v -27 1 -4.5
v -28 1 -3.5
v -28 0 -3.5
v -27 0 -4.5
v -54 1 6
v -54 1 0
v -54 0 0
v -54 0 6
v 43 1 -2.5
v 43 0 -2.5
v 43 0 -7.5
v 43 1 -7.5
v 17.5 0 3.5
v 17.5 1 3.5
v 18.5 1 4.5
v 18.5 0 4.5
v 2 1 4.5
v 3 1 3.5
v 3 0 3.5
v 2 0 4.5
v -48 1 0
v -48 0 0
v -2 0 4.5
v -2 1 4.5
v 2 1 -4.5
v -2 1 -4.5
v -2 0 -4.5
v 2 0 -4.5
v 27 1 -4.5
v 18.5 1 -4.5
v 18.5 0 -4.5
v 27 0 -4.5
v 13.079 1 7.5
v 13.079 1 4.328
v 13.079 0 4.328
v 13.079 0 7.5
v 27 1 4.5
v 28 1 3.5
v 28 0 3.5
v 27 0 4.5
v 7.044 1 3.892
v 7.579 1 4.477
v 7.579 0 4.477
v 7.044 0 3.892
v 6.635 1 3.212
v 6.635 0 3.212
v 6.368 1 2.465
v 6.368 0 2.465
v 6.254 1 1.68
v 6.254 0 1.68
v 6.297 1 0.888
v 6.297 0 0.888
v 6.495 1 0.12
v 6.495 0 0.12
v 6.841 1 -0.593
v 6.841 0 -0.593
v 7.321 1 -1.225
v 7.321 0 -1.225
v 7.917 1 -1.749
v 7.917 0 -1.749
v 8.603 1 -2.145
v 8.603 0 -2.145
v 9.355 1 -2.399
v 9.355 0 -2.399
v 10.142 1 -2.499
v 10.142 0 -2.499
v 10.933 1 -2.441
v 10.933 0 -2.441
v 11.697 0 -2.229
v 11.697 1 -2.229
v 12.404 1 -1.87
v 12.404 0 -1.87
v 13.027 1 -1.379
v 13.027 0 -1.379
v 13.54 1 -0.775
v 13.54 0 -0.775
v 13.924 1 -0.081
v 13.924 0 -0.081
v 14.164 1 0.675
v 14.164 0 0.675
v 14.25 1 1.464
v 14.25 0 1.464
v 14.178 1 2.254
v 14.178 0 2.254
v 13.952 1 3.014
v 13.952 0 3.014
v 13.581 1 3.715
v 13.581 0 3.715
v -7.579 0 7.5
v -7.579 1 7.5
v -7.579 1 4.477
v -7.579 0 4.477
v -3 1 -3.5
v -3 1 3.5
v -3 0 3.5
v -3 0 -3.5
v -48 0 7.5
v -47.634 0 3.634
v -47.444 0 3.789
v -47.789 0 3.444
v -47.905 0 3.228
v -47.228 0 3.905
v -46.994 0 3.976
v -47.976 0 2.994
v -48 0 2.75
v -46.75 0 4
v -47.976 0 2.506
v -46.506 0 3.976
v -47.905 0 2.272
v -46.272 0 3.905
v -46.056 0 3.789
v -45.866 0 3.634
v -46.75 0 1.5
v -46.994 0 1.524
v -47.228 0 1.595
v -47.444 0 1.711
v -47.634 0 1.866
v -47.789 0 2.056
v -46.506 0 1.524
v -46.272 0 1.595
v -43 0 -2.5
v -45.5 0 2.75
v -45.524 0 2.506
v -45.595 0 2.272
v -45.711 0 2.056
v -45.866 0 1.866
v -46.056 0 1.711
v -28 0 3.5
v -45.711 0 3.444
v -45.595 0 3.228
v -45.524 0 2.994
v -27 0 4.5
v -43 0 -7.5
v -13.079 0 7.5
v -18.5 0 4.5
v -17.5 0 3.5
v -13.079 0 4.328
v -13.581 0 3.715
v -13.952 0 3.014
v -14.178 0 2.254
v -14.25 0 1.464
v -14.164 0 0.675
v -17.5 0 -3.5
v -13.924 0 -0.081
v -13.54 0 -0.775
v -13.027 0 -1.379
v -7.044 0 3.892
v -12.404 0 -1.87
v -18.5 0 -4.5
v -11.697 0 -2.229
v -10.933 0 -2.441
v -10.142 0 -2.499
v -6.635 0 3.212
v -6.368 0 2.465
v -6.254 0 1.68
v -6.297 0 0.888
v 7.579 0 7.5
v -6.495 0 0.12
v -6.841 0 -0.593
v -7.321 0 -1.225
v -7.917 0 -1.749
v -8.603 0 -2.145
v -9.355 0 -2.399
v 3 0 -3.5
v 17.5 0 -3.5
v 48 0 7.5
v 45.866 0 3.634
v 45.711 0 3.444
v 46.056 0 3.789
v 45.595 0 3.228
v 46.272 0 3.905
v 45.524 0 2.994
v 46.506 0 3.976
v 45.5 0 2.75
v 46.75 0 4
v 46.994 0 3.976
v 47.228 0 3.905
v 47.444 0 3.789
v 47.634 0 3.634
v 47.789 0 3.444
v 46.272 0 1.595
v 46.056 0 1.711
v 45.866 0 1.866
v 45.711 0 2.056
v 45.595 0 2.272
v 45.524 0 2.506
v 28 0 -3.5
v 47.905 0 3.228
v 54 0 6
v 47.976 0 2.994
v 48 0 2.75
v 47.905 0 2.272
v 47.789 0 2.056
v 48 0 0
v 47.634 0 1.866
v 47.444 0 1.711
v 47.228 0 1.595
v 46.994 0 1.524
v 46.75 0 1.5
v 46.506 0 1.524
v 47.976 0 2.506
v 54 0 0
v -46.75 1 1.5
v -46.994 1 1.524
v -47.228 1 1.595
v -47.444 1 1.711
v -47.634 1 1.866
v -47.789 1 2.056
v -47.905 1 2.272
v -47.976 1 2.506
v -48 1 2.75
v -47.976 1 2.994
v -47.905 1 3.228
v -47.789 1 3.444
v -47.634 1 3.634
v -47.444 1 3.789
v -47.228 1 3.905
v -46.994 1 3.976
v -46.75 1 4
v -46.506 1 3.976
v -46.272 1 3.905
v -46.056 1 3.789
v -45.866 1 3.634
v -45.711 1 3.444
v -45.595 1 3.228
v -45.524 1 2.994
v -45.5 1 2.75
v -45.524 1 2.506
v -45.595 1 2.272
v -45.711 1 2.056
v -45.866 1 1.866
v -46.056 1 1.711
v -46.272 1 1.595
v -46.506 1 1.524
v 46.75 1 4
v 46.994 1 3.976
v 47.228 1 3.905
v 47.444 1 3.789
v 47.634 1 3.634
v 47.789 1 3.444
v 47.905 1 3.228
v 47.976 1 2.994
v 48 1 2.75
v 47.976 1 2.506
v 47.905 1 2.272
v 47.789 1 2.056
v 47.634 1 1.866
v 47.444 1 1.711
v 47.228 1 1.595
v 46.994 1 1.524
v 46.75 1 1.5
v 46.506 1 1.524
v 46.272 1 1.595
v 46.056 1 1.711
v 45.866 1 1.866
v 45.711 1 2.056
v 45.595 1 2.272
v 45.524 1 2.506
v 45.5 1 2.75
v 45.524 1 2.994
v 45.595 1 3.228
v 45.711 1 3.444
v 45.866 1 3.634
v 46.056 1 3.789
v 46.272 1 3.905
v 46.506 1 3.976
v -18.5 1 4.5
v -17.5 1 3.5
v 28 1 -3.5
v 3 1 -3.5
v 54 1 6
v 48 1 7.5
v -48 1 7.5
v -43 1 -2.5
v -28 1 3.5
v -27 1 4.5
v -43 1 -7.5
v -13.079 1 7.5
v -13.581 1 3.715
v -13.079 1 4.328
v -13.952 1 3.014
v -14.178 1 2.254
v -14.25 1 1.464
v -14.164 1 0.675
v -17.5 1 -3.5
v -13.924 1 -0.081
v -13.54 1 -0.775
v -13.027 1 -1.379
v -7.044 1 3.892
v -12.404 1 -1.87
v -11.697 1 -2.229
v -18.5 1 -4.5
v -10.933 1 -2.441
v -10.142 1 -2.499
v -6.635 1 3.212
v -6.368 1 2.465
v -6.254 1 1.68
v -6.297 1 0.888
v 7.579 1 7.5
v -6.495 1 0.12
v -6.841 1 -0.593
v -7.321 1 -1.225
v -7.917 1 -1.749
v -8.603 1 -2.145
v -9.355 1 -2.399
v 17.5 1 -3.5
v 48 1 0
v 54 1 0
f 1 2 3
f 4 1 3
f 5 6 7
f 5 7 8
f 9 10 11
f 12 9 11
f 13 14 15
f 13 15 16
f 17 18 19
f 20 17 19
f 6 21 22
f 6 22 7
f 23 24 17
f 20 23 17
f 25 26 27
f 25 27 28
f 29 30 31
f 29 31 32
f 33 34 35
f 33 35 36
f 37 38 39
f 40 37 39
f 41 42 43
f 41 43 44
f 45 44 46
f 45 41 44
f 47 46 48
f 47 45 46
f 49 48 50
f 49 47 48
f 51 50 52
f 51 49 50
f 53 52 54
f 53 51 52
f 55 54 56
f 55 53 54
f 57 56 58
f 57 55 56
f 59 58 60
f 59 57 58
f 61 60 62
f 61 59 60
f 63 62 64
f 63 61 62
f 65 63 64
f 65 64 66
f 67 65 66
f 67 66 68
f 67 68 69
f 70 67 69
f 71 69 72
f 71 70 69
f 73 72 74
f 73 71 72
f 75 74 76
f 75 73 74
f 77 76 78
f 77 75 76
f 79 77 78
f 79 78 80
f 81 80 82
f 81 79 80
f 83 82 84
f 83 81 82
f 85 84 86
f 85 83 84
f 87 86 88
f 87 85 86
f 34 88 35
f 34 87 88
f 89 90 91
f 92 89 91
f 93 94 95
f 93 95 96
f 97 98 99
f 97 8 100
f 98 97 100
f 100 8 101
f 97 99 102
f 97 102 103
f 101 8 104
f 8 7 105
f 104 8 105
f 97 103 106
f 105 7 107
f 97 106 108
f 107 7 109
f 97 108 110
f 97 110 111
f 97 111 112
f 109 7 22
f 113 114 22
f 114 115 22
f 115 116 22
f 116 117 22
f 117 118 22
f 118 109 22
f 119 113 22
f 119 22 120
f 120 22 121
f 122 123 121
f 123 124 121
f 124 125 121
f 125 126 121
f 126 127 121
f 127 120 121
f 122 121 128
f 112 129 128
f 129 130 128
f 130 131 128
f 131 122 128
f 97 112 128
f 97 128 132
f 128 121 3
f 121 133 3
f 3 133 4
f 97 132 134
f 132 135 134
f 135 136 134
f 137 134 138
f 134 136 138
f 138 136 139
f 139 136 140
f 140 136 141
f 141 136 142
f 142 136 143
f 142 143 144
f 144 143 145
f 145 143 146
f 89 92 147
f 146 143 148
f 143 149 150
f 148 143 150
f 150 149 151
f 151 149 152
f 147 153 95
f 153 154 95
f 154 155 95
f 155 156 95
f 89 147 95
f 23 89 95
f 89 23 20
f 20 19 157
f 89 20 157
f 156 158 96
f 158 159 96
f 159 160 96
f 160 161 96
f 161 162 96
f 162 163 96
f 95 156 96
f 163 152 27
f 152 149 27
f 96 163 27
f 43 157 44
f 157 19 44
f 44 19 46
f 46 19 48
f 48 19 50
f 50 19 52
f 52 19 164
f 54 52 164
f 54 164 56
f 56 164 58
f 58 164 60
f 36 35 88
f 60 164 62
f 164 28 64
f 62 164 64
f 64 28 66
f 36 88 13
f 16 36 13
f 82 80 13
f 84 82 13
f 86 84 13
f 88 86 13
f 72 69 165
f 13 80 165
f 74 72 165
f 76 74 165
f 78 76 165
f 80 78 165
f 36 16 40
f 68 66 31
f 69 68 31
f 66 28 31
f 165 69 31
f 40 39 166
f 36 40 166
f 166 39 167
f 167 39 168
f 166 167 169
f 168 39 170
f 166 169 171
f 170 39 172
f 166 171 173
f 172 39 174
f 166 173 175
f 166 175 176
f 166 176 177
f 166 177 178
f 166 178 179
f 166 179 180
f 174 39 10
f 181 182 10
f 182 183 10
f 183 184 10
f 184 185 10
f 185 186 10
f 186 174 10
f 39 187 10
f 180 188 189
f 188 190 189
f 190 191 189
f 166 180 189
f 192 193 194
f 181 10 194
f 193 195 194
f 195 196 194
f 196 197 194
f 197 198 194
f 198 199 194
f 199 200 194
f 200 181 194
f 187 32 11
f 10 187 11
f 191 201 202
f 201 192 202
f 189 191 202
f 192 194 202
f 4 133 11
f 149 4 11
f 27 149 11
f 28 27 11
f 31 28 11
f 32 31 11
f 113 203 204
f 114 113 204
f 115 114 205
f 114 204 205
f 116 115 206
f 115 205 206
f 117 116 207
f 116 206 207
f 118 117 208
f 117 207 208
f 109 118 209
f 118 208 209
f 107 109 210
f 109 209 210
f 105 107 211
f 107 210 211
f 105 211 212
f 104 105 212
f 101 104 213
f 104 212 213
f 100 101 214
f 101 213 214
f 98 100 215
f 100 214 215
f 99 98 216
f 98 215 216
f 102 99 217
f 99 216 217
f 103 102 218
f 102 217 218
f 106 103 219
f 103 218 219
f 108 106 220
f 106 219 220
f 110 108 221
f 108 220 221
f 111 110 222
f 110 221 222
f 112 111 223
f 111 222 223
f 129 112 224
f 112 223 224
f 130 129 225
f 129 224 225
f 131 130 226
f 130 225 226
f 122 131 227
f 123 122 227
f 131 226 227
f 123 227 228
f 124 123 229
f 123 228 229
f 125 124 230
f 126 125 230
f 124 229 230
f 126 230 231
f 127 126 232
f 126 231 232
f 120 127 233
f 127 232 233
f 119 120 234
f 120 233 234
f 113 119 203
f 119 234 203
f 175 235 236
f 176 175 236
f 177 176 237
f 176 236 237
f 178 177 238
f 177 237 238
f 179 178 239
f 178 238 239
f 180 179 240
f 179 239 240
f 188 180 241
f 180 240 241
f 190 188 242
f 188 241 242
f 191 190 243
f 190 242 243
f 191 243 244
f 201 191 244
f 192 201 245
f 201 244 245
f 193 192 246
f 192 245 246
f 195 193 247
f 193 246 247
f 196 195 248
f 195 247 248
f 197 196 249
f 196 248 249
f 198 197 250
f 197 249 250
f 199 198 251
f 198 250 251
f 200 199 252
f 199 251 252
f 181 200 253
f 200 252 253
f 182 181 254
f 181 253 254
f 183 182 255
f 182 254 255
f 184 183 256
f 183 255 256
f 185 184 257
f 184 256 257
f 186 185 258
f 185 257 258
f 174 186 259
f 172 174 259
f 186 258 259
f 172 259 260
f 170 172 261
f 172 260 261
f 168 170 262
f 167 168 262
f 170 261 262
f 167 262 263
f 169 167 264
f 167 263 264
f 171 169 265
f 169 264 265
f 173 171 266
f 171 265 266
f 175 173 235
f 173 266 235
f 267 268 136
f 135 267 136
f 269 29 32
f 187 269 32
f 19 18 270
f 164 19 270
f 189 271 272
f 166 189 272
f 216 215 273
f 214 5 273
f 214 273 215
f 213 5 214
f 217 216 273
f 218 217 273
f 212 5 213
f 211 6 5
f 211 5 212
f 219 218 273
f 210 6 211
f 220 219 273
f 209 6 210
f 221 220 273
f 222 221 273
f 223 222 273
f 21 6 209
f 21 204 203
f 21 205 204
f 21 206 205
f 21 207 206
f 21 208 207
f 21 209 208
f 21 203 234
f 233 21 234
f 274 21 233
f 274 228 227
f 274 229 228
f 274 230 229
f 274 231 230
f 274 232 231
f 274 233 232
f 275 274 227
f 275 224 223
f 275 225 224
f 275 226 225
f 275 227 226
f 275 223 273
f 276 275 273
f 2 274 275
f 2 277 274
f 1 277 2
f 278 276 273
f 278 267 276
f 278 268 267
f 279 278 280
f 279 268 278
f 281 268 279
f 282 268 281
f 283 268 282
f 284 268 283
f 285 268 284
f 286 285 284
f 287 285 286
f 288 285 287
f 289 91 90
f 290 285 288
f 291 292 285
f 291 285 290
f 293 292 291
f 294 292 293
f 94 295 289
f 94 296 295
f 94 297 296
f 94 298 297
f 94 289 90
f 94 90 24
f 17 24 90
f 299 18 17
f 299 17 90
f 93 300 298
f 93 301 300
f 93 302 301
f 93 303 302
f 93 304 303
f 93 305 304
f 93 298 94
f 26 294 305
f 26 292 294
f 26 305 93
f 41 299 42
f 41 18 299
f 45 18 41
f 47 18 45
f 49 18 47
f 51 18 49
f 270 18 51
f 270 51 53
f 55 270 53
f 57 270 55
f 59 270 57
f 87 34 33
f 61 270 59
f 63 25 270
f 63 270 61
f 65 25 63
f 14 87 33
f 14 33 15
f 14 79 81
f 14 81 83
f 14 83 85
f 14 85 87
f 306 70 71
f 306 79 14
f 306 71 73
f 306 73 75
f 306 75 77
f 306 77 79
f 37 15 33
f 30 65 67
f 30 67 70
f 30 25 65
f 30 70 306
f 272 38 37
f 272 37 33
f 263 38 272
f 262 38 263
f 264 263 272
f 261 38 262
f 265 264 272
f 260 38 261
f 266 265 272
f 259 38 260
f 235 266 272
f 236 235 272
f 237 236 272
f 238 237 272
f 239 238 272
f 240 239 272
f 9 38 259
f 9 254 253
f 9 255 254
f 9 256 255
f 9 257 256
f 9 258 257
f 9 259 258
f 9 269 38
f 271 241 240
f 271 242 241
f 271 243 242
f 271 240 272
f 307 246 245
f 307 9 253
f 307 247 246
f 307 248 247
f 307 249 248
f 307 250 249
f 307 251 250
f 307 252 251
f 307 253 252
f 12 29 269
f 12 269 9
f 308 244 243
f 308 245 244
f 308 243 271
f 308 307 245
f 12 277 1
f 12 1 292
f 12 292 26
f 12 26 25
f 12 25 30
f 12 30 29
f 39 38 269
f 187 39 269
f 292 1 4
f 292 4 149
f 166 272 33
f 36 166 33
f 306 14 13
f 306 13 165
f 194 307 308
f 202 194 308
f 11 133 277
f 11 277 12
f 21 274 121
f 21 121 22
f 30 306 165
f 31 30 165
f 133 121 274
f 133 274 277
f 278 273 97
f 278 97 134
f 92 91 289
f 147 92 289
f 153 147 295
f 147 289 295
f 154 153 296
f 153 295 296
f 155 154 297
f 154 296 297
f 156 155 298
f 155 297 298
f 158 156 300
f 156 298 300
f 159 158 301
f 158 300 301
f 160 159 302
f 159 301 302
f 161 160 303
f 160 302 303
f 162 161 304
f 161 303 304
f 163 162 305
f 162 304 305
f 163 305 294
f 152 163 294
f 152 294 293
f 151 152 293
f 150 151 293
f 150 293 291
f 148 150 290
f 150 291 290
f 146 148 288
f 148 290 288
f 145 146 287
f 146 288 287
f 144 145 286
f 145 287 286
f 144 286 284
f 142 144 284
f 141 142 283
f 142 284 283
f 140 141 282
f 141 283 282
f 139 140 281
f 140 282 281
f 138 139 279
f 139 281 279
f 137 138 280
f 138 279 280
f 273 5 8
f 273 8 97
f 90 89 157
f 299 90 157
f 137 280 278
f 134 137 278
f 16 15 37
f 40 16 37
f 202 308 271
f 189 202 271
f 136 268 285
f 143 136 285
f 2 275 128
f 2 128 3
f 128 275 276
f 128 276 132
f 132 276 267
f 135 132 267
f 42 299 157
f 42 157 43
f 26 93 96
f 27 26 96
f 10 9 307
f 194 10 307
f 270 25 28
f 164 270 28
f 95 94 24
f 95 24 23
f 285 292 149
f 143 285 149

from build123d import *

# Parameters (mm, degrees)
CROQUIS1_W                = 86
CROQUIS1_H                = 15
SALIENTE_EXTRUIR1_DEPTH   = 1
CROQUIS2_W                = 6
CROQUIS2_H                = 9
CROQUIS2_W_2              = 10.5
CORTAR_EXTRUIR1_DEPTH     = 1
CHAFL_N1_SIZE             = 1
CORTAR_EXTRUIR2_DEPTH     = 1
CROQUIS4_R                = 1.25
SALIENTE_EXTRUIR2_DEPTH   = 1
SALIENTE_EXTRUIR2_2_DEPTH = 1


with BuildPart() as part:
    # Croquis1 → Saliente-Extruir1 (new body)
    with BuildSketch(Plane(origin=(0, 0, 0), x_dir=(1, 0, 0), z_dir=(0, 1, 0))):
        Rectangle(CROQUIS1_W, CROQUIS1_H)
    extrude(amount=SALIENTE_EXTRUIR1_DEPTH)

    # Croquis2 → Cortar-Extruir1 (cut)
    with BuildSketch(Plane(origin=(0, 1, 0), x_dir=(1, 0, 0), z_dir=(0, 1, 0))):
        Rectangle(CROQUIS2_W, CROQUIS2_H)
        with Locations((22.75, 0)):
            Rectangle(CROQUIS2_W_2, CROQUIS2_H)
        with Locations((-22.75, 0)):
            Rectangle(CROQUIS2_W_2, CROQUIS2_H)
    extrude(amount=-CORTAR_EXTRUIR1_DEPTH, mode=Mode.SUBTRACT)

    # Chaflán1
    chafl_n1_edges = [part.edges().sort_by_distance(p)[0] for p in [
        (17.5, 0.5, -4.5),
        (28, 0.5, -4.5),
        (3, 0.5, -4.5),
        (-3, 0.5, -4.5),
        (-3, 0.5, 4.5),
        (17.5, 0.5, 4.5),
        (28, 0.5, 4.5),
        (3, 0.5, 4.5),
        (-17.5, 0.5, 4.5),
        (-28, 0.5, 4.5),
        (-17.5, 0.5, -4.5),
        (-28, 0.5, -4.5),
    ]]
    chamfer(chafl_n1_edges, length=CHAFL_N1_SIZE)

    # Croquis3 → Cortar-Extruir2 (cut)
    with BuildSketch(Plane(origin=(0, 1, 0), x_dir=(1, 0, 0), z_dir=(0, 1, 0))):
        with BuildLine():
            Line((-13.078515717, -7.5), (-7.578515717, -7.5))
            Line((-7.578515717, -7.5), (-7.578515717, -4.477107947))
            ThreePointArc((-7.578515717, -4.477107947), (-10.141843619, 2.498537507), (-13.078515717, -4.32833853))
            Line((-13.078515717, -4.32833853), (-13.078515717, -7.5))
        make_face()
        with BuildLine():
            Line((7.578515717, -7.5), (7.578515717, -4.477107947))
            ThreePointArc((7.578515717, -4.477107947), (10.141843619, 2.498537507), (13.078515717, -4.32833853))
            Line((13.078515717, -4.32833853), (13.078515717, -7.5))
            Line((13.078515717, -7.5), (7.578515717, -7.5))
        make_face()
    extrude(amount=-CORTAR_EXTRUIR2_DEPTH, mode=Mode.SUBTRACT)


with BuildPart() as body_2:
    # Croquis4 → Saliente-Extruir2 (new body)
    with BuildSketch(Plane(origin=(0, 1, 0), x_dir=(1, 0, 0), z_dir=(0, 1, 0))):
        Polygon((43, 2.5), (48, 0), (54, 0), (54, -6), (48, -7.5), (43, -7.5), align=None)
        with Locations((46.75, -2.75)):
            Circle(CROQUIS4_R, mode=Mode.SUBTRACT)
    extrude(amount=-SALIENTE_EXTRUIR2_DEPTH)


with BuildPart() as body_3:
    # Croquis4 → Saliente-Extruir2 2 (new body)
    with BuildSketch(Plane(origin=(0, 1, 0), x_dir=(1, 0, 0), z_dir=(0, 1, 0))):
        Polygon((-43, 2.5), (-48, 0), (-54, 0), (-54, -6), (-48, -7.5), (-43, -7.5), align=None)
        with Locations((-46.75, -2.75)):
            Circle(CROQUIS4_R, mode=Mode.SUBTRACT)
    extrude(amount=-SALIENTE_EXTRUIR2_2_DEPTH)


with BuildPart() as part_1:
    add(part.part)

    # Combinar1: union body 2, body 3
    add(body_2.part)
    add(body_3.part)


solid = part_1.part
